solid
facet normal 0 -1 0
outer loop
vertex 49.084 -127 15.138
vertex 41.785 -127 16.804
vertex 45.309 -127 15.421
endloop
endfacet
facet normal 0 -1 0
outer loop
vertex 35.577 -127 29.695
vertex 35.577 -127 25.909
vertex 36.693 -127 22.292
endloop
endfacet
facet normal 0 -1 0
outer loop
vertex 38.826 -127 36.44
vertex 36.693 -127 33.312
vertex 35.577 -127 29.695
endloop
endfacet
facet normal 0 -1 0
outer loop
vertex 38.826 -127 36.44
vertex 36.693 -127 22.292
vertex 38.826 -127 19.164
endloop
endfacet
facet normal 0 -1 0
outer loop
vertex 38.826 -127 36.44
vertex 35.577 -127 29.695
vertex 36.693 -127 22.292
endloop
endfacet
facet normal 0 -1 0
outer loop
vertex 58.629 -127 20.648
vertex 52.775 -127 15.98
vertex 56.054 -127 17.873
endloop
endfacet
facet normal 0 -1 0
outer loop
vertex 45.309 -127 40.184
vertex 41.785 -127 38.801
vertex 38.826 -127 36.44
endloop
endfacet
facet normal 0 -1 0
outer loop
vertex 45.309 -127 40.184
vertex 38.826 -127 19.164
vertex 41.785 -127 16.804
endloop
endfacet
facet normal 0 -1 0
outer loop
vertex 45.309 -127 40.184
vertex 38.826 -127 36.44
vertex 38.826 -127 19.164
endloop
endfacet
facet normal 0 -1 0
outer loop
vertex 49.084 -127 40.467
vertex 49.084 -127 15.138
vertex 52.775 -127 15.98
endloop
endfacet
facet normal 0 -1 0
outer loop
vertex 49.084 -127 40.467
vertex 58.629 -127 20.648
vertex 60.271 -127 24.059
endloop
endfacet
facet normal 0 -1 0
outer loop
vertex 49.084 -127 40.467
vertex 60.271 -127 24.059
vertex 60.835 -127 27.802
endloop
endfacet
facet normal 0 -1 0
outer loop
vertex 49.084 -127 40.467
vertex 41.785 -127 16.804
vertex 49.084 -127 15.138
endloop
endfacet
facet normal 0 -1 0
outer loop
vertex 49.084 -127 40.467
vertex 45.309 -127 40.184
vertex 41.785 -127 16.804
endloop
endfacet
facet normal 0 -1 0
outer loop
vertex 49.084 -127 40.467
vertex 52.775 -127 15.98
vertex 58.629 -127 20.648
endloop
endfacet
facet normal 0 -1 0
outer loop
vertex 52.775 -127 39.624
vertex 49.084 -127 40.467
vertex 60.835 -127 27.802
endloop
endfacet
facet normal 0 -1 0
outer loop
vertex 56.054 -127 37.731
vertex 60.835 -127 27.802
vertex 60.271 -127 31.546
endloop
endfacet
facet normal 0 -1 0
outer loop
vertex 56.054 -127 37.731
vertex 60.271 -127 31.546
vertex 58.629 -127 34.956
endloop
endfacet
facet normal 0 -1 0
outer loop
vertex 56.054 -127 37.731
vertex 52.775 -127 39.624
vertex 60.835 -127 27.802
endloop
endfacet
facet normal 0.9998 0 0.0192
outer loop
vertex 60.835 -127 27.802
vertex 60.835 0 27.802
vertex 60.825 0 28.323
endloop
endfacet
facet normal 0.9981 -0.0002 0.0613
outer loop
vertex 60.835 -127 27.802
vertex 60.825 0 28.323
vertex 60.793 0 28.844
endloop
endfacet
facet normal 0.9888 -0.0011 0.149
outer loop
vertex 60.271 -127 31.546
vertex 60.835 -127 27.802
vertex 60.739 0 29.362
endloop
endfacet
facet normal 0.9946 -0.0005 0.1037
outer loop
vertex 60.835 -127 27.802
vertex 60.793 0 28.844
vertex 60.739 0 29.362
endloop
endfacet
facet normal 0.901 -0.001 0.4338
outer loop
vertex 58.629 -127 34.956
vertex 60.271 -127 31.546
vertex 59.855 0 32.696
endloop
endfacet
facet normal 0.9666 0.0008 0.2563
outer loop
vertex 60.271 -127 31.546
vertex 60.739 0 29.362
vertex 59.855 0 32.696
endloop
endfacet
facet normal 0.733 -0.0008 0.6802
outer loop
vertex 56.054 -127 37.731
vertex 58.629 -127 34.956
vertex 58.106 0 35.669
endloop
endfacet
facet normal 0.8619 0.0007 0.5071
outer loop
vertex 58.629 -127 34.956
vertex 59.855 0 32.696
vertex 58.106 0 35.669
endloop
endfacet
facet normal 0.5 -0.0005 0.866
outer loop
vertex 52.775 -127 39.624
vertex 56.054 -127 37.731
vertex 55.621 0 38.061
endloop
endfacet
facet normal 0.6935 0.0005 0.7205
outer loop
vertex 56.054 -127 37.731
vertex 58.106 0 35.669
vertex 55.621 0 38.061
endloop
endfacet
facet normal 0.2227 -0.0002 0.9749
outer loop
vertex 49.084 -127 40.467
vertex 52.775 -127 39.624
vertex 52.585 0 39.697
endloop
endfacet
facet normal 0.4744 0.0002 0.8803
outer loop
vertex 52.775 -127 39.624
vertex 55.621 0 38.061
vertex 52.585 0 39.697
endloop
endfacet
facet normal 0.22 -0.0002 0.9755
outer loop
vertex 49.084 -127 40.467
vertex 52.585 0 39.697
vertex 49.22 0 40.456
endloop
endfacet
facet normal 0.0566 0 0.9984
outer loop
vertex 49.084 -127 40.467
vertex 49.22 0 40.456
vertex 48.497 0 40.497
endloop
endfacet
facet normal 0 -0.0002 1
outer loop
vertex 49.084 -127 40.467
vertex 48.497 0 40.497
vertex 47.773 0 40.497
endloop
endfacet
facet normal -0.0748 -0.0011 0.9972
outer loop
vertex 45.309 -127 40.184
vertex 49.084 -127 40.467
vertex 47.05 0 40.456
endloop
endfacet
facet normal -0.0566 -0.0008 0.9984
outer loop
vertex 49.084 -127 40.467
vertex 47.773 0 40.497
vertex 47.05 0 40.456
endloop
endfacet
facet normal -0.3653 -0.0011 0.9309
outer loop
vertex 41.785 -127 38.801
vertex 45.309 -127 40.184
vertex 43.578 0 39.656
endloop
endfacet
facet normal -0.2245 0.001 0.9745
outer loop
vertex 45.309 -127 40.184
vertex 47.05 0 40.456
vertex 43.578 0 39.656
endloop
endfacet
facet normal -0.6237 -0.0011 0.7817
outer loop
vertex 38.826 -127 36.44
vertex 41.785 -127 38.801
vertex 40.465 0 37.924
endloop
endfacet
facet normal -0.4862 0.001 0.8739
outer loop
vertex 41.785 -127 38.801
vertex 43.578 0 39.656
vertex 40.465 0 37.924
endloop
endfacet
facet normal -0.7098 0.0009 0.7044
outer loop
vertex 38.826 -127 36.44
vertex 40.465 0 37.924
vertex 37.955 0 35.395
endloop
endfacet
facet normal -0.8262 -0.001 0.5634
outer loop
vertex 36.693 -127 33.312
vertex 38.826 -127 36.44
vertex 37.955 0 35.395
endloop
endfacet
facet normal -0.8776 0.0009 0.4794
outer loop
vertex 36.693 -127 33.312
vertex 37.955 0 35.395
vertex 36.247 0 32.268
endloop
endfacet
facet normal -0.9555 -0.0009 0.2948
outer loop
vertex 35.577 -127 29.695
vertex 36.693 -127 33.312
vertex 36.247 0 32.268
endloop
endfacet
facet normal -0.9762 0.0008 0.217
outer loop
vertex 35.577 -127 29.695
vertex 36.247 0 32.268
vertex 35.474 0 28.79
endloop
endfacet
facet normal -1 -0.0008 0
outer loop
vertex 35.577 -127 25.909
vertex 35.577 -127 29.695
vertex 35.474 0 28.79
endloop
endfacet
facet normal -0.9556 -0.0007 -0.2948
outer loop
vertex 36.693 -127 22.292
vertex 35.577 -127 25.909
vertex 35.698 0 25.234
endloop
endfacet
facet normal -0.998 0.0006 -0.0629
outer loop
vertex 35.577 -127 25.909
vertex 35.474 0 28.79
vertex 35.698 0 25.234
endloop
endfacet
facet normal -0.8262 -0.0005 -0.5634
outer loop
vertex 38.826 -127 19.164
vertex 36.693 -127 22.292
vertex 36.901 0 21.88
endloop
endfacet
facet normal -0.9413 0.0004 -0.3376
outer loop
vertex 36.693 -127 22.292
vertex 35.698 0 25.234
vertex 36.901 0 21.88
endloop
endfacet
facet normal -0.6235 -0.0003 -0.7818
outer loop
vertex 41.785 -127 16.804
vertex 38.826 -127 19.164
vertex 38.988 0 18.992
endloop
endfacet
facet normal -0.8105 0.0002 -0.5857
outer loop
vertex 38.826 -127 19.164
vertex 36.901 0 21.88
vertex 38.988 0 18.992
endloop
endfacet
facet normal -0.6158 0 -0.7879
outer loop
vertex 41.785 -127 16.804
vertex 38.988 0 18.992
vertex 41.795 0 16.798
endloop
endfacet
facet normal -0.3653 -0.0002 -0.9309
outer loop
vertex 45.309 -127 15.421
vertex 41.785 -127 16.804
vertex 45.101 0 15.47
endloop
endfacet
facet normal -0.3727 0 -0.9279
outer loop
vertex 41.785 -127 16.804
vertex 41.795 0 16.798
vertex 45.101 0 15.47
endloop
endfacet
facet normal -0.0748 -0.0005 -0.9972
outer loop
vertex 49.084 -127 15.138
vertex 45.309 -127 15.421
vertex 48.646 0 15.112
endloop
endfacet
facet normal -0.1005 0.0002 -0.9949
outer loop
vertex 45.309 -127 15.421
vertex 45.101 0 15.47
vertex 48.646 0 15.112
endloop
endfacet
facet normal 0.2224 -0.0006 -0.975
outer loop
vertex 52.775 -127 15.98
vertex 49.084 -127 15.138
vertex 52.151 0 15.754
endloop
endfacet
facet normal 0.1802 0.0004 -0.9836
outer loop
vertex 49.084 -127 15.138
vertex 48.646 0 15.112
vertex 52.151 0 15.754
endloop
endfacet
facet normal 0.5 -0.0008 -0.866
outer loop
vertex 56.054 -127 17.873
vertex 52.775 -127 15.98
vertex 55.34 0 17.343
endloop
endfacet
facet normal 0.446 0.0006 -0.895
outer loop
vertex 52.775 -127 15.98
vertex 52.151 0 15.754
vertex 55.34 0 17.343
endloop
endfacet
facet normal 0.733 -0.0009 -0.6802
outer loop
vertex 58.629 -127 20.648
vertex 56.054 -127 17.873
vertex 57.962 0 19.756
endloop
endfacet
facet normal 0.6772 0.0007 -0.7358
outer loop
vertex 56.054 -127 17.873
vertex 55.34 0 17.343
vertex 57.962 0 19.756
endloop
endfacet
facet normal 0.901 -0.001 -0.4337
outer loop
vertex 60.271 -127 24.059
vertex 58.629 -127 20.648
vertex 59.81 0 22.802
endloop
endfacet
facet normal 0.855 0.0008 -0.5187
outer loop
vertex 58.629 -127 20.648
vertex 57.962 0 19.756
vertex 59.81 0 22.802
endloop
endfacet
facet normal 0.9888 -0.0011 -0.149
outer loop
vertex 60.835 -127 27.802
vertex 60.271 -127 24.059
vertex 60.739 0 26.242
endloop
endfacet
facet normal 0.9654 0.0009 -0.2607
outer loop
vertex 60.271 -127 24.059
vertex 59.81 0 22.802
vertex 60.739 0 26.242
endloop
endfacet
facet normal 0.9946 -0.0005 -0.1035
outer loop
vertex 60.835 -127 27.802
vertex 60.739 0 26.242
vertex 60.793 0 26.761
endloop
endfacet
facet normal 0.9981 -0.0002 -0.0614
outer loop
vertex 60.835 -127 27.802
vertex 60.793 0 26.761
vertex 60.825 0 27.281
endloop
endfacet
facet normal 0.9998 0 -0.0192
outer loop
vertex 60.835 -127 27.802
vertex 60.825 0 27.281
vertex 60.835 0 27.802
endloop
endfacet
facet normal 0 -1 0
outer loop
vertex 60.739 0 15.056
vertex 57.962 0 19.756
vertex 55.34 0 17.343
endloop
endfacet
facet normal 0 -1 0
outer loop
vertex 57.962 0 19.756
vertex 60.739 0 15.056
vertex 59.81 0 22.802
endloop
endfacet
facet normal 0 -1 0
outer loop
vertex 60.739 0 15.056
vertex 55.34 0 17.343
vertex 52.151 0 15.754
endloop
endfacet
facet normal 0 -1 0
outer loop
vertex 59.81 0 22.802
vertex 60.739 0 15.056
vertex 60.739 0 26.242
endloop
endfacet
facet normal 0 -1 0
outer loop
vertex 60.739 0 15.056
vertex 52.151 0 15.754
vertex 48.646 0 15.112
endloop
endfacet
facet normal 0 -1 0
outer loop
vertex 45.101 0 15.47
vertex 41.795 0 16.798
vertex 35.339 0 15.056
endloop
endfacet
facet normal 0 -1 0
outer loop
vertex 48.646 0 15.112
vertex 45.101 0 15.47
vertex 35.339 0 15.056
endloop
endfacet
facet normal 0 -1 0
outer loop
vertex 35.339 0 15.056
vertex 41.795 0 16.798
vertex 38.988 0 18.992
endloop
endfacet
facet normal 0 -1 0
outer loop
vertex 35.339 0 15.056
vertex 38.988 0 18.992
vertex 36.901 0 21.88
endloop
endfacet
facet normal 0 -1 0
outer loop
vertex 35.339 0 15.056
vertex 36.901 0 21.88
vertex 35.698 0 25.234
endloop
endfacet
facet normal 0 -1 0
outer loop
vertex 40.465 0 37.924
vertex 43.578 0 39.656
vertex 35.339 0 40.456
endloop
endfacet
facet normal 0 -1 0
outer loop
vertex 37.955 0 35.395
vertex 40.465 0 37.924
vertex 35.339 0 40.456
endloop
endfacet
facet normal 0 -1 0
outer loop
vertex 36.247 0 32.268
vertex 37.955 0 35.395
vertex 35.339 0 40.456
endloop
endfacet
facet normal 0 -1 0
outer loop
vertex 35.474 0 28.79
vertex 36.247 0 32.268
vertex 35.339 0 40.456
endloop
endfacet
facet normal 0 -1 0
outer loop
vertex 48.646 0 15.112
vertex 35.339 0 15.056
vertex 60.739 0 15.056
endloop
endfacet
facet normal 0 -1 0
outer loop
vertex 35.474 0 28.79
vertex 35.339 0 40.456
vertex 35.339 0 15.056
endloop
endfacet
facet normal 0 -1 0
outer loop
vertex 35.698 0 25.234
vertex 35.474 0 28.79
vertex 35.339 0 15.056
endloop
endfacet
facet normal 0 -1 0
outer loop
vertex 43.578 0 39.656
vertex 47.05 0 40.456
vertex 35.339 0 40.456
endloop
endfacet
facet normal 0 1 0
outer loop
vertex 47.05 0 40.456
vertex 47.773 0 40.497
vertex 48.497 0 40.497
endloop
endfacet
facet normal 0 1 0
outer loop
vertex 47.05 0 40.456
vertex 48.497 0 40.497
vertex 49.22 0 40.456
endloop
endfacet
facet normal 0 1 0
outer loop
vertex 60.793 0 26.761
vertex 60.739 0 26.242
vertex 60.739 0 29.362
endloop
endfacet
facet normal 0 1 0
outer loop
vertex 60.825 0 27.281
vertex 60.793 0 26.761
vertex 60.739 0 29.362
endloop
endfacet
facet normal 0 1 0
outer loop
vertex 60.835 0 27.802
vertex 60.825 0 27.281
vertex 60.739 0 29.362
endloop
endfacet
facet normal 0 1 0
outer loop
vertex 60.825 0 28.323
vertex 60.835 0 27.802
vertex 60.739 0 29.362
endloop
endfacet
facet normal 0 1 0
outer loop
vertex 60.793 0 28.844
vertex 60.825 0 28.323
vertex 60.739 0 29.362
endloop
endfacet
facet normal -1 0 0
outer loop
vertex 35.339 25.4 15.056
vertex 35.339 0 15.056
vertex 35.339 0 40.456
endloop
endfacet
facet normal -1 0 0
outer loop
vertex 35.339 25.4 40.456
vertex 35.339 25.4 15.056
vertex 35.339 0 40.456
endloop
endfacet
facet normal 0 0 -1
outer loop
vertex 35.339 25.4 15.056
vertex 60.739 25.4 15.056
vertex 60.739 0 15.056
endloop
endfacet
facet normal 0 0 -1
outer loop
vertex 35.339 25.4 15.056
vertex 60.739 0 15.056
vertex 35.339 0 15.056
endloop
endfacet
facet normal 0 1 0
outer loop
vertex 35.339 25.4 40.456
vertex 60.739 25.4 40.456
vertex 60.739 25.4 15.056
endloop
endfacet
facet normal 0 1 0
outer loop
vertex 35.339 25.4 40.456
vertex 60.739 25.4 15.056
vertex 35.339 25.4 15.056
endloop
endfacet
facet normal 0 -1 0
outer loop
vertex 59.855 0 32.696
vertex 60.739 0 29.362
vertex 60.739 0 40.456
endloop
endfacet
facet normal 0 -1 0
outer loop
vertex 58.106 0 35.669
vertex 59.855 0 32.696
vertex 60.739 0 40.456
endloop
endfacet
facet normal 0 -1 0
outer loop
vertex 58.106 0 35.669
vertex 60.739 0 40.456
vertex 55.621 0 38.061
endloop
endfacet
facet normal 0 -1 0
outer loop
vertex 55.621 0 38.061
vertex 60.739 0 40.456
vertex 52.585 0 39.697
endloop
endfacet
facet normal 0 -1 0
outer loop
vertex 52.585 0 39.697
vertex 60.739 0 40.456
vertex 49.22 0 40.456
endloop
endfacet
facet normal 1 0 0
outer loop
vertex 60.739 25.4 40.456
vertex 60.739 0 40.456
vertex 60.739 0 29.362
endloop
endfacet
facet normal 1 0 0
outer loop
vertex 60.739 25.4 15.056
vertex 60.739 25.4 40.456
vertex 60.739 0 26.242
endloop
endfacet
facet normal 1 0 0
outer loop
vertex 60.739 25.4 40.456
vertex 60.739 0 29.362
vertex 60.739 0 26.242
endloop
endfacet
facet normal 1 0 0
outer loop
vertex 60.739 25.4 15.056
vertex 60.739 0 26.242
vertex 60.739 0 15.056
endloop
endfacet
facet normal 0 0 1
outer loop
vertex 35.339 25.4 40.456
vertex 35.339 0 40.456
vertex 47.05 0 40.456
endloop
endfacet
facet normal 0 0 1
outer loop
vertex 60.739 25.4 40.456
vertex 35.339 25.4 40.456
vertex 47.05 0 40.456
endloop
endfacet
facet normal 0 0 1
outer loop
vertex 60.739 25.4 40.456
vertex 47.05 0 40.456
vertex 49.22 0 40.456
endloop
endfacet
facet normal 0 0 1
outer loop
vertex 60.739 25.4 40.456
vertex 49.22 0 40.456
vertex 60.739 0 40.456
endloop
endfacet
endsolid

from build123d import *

# Parameters (mm, degrees)
F0_R     = 12.7
F1_DEPTH = 127
F5_DEPTH = 25.4


# Not quite as in the source:
# - the program builds the solid bodies; features that only make, move or delete a surface that nothing else refers to are left out


with BuildPart() as f1:
    # F0 (on Front) → F1 (new body)
    with BuildSketch(Plane.XZ):
        with Locations((48.1354147196, 27.8021357954)):
            Circle(F0_R)
    extrude(amount=F1_DEPTH)

    # F2 (on face) → F5 (join)
    with BuildSketch(Plane(origin=(0, 0, 0), x_dir=(-1, 0, 0), z_dir=(0, 1, 0))):
        with BuildLine():
            Line((-49.2203550876, 40.4557085872), (-60.73924371, 40.4557085872))
            Line((-60.73924371, 40.4557085872), (-60.73924371, 29.3621020704))
            ThreePointArc((-60.73924371, 29.3621020704), (-56.94521767, 36.9496694507), (-49.2203550876, 40.4557085872))
        make_face()
        with BuildLine():
            Line((-35.33924371, 40.4557085872), (-47.0504743515, 40.4557085872))
            ThreePointArc((-47.0504743515, 40.4557085872), (-38.7794342078, 36.3902455212), (-35.4354147196, 27.8021357954))
            ThreePointArc((-35.4354147196, 27.8021357954), (-47.3539507661, 15.126201349), (-60.73924371, 26.2421695203))
            Line((-60.73924371, 26.2421695203), (-60.73924371, 15.0557085872))
            Line((-60.73924371, 15.0557085872), (-35.33924371, 15.0557085872))
            Line((-35.33924371, 15.0557085872), (-35.33924371, 40.4557085872))
        make_face()
        with BuildLine():
            Line((-47.0504743515, 40.4557085872), (-49.2203550876, 40.4557085872))
            ThreePointArc((-49.2203550876, 40.4557085872), (-56.94521767, 36.9496694507), (-60.73924371, 29.3621020704))
            Line((-60.73924371, 29.3621020704), (-60.73924371, 26.2421695203))
            ThreePointArc((-60.73924371, 26.2421695203), (-47.3539507661, 15.126201349), (-35.4354147196, 27.8021357954))
            ThreePointArc((-35.4354147196, 27.8021357954), (-38.7794342078, 36.3902455212), (-47.0504743515, 40.4557085872))
        make_face()
    extrude(amount=F5_DEPTH)


solid = f1.part
